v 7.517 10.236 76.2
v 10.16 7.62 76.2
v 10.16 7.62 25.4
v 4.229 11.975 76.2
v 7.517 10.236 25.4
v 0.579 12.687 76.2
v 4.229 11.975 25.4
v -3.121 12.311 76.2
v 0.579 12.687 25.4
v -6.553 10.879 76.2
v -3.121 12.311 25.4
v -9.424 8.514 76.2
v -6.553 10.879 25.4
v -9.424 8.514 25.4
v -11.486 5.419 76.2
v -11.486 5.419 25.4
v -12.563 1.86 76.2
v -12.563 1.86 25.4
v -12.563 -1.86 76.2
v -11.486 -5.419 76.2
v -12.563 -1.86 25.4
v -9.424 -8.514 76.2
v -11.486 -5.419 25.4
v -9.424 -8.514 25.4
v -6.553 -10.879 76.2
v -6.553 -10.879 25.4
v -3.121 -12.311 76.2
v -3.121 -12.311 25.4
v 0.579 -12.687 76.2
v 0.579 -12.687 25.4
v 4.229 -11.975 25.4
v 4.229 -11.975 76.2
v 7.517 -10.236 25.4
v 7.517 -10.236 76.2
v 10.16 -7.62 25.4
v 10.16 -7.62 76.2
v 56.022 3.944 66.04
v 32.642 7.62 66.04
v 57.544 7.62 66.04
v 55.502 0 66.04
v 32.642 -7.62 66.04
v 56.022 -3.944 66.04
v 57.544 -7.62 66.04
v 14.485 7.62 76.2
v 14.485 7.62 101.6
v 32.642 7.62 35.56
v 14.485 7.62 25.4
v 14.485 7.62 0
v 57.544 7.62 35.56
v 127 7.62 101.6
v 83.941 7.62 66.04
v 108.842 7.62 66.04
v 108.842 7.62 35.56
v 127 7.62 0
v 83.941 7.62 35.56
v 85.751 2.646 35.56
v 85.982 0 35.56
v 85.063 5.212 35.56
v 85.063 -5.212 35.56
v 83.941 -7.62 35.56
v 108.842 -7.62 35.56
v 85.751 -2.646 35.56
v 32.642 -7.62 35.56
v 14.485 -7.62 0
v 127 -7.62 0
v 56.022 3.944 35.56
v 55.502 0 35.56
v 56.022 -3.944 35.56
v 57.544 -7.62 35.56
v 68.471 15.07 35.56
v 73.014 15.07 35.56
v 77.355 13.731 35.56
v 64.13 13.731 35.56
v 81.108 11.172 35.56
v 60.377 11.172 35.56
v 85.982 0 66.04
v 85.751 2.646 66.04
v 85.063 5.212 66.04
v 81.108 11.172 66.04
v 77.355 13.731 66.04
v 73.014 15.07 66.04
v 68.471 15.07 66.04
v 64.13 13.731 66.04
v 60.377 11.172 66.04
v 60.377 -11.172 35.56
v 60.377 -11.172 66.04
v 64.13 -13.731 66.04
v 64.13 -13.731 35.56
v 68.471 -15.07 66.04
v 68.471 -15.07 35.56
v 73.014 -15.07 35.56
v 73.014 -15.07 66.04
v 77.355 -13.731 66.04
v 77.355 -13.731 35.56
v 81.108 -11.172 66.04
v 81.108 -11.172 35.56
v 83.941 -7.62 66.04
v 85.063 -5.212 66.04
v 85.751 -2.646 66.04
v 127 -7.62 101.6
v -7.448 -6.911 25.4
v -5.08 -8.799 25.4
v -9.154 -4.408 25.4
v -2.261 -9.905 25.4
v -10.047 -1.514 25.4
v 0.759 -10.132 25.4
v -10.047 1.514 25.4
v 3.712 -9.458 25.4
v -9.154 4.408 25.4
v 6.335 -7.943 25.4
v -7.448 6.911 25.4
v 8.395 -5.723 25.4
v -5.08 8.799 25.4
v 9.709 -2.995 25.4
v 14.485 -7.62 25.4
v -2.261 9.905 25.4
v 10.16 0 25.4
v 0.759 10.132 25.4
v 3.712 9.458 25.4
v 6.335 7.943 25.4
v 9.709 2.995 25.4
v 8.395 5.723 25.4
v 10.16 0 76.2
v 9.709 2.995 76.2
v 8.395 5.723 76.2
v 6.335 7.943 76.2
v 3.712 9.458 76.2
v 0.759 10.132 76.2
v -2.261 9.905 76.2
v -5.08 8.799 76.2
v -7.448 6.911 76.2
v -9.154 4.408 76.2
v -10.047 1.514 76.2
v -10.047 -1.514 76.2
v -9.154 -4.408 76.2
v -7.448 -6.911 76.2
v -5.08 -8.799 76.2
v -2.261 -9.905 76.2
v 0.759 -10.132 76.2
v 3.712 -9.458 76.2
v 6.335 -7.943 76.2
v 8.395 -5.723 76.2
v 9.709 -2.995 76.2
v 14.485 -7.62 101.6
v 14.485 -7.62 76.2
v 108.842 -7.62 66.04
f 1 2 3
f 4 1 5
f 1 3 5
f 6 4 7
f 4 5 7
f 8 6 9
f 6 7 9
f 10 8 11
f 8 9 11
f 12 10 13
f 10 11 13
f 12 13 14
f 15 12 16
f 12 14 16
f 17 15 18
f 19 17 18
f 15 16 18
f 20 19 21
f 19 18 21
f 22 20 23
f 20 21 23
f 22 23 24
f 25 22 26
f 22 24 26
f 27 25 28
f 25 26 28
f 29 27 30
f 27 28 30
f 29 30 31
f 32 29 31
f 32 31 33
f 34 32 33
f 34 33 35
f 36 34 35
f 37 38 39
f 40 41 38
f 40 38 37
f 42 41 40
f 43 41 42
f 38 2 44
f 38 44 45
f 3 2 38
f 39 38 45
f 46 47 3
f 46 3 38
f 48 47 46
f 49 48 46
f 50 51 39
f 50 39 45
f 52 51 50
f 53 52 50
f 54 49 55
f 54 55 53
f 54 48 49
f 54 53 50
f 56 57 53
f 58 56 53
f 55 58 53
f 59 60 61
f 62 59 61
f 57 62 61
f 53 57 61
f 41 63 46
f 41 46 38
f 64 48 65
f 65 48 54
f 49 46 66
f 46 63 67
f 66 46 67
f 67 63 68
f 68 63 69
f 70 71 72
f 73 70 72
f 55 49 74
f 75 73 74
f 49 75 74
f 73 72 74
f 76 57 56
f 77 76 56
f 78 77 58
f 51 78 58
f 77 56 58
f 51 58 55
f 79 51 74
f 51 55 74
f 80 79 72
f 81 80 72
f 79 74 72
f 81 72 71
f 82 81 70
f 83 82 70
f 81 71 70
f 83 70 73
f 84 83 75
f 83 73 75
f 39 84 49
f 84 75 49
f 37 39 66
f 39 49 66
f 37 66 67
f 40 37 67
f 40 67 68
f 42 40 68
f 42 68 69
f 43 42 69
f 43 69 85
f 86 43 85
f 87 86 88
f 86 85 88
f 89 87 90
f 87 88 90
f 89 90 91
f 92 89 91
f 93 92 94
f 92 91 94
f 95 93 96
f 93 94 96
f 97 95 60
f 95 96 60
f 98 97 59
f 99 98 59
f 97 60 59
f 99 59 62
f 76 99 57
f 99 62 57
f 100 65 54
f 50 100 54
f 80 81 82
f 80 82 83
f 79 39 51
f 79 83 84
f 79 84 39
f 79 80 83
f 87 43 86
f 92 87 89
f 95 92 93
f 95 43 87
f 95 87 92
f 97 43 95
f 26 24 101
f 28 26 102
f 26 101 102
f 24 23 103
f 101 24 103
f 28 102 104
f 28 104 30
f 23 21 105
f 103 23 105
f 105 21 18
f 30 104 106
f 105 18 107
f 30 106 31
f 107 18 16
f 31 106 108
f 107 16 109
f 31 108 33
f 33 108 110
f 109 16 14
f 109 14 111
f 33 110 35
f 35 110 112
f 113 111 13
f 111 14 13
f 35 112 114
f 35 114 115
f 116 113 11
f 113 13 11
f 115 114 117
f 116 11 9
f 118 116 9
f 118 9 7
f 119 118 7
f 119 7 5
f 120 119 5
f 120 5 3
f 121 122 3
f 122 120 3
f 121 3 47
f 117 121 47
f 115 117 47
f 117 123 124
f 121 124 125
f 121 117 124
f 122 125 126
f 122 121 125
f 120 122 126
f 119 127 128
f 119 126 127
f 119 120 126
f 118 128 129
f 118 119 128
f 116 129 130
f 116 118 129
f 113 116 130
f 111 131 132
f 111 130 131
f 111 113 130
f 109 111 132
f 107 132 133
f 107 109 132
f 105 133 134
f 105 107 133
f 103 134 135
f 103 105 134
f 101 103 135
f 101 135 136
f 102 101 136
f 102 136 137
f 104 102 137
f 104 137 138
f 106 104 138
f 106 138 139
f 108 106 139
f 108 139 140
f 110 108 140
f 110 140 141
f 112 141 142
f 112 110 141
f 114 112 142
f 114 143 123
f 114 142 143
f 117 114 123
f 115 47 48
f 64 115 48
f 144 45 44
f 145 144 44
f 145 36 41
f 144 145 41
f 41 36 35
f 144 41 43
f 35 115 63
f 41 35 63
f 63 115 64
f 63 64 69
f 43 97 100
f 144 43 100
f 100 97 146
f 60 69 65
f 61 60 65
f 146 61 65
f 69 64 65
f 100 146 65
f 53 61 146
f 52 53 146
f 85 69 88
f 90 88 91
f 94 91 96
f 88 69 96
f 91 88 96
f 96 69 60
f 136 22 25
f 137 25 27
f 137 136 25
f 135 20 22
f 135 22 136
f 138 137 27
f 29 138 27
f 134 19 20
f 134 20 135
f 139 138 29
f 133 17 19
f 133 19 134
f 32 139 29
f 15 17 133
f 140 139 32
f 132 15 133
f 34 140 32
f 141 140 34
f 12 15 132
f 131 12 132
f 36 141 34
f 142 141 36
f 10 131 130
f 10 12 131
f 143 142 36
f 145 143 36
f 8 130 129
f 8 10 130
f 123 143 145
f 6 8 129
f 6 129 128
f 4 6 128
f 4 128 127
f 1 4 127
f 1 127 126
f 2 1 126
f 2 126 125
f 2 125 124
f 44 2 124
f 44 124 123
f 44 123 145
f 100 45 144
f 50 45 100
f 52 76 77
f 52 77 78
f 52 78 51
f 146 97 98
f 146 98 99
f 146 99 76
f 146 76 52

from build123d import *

# Parameters (mm, degrees)
SKETCH1_R               = 12.7
SKETCH1_R_2             = 10.16
SKETCH1_W               = 116.84
SKETCH1_H               = 15.24
BOSS_EXTRUDE1_DEPTH     = 101.6
SKETCH2_W               = 27.184704077
SKETCH2_H               = 25.4
CUT_EXTRUDE1_DEPTH      = 6.08
CUT_EXTRUDE1_DEPTH_BACK = 21.32
SKETCH3_W               = 76.2
SKETCH3_H               = 30.48
CUT_EXTRUDE2_DEPTH      = 21.32
SKETCH4_R               = 15.24
BOSS_EXTRUDE2_DEPTH     = 30.48


with BuildPart() as part:
    # Sketch1 → Boss-Extrude1 (new body)
    with BuildSketch(Plane.XY):
        Circle(SKETCH1_R)
        Circle(SKETCH1_R_2, mode=Mode.SUBTRACT)
        with Locations((68.58, 0)):
            Rectangle(SKETCH1_W, SKETCH1_H)
    extrude(amount=BOSS_EXTRUDE1_DEPTH)

    # Sketch2 → Cut-Extrude1 (cut, two sides)
    with BuildSketch(Plane(origin=(0, 7.62, 0), x_dir=(1, 0, 0), z_dir=(0, 1, 0))) as cut_extrude1_sk:
        with Locations((0.892352039, -88.9)):
            Rectangle(SKETCH2_W, SKETCH2_H)
        with Locations((0.892352039, -12.7)):
            Rectangle(SKETCH2_W, SKETCH2_H)
    extrude(amount=CUT_EXTRUDE1_DEPTH, mode=Mode.SUBTRACT)
    extrude(cut_extrude1_sk.sketch, amount=-CUT_EXTRUDE1_DEPTH_BACK, mode=Mode.SUBTRACT)

    # Sketch3 → Cut-Extrude2 (cut, through all)
    with BuildSketch(Plane.XZ.offset(7.62)):
        with Locations((70.742352039, 50.8)):
            Rectangle(SKETCH3_W, SKETCH3_H)
    extrude(amount=-CUT_EXTRUDE2_DEPTH, mode=Mode.SUBTRACT)

    # Sketch4 → Boss-Extrude2 (add)
    with BuildSketch(Plane.XY.offset(35.56)):
        with Locations((70.742352039, 0)):
            Circle(SKETCH4_R)
    extrude(amount=BOSS_EXTRUDE2_DEPTH)


solid = part.part
